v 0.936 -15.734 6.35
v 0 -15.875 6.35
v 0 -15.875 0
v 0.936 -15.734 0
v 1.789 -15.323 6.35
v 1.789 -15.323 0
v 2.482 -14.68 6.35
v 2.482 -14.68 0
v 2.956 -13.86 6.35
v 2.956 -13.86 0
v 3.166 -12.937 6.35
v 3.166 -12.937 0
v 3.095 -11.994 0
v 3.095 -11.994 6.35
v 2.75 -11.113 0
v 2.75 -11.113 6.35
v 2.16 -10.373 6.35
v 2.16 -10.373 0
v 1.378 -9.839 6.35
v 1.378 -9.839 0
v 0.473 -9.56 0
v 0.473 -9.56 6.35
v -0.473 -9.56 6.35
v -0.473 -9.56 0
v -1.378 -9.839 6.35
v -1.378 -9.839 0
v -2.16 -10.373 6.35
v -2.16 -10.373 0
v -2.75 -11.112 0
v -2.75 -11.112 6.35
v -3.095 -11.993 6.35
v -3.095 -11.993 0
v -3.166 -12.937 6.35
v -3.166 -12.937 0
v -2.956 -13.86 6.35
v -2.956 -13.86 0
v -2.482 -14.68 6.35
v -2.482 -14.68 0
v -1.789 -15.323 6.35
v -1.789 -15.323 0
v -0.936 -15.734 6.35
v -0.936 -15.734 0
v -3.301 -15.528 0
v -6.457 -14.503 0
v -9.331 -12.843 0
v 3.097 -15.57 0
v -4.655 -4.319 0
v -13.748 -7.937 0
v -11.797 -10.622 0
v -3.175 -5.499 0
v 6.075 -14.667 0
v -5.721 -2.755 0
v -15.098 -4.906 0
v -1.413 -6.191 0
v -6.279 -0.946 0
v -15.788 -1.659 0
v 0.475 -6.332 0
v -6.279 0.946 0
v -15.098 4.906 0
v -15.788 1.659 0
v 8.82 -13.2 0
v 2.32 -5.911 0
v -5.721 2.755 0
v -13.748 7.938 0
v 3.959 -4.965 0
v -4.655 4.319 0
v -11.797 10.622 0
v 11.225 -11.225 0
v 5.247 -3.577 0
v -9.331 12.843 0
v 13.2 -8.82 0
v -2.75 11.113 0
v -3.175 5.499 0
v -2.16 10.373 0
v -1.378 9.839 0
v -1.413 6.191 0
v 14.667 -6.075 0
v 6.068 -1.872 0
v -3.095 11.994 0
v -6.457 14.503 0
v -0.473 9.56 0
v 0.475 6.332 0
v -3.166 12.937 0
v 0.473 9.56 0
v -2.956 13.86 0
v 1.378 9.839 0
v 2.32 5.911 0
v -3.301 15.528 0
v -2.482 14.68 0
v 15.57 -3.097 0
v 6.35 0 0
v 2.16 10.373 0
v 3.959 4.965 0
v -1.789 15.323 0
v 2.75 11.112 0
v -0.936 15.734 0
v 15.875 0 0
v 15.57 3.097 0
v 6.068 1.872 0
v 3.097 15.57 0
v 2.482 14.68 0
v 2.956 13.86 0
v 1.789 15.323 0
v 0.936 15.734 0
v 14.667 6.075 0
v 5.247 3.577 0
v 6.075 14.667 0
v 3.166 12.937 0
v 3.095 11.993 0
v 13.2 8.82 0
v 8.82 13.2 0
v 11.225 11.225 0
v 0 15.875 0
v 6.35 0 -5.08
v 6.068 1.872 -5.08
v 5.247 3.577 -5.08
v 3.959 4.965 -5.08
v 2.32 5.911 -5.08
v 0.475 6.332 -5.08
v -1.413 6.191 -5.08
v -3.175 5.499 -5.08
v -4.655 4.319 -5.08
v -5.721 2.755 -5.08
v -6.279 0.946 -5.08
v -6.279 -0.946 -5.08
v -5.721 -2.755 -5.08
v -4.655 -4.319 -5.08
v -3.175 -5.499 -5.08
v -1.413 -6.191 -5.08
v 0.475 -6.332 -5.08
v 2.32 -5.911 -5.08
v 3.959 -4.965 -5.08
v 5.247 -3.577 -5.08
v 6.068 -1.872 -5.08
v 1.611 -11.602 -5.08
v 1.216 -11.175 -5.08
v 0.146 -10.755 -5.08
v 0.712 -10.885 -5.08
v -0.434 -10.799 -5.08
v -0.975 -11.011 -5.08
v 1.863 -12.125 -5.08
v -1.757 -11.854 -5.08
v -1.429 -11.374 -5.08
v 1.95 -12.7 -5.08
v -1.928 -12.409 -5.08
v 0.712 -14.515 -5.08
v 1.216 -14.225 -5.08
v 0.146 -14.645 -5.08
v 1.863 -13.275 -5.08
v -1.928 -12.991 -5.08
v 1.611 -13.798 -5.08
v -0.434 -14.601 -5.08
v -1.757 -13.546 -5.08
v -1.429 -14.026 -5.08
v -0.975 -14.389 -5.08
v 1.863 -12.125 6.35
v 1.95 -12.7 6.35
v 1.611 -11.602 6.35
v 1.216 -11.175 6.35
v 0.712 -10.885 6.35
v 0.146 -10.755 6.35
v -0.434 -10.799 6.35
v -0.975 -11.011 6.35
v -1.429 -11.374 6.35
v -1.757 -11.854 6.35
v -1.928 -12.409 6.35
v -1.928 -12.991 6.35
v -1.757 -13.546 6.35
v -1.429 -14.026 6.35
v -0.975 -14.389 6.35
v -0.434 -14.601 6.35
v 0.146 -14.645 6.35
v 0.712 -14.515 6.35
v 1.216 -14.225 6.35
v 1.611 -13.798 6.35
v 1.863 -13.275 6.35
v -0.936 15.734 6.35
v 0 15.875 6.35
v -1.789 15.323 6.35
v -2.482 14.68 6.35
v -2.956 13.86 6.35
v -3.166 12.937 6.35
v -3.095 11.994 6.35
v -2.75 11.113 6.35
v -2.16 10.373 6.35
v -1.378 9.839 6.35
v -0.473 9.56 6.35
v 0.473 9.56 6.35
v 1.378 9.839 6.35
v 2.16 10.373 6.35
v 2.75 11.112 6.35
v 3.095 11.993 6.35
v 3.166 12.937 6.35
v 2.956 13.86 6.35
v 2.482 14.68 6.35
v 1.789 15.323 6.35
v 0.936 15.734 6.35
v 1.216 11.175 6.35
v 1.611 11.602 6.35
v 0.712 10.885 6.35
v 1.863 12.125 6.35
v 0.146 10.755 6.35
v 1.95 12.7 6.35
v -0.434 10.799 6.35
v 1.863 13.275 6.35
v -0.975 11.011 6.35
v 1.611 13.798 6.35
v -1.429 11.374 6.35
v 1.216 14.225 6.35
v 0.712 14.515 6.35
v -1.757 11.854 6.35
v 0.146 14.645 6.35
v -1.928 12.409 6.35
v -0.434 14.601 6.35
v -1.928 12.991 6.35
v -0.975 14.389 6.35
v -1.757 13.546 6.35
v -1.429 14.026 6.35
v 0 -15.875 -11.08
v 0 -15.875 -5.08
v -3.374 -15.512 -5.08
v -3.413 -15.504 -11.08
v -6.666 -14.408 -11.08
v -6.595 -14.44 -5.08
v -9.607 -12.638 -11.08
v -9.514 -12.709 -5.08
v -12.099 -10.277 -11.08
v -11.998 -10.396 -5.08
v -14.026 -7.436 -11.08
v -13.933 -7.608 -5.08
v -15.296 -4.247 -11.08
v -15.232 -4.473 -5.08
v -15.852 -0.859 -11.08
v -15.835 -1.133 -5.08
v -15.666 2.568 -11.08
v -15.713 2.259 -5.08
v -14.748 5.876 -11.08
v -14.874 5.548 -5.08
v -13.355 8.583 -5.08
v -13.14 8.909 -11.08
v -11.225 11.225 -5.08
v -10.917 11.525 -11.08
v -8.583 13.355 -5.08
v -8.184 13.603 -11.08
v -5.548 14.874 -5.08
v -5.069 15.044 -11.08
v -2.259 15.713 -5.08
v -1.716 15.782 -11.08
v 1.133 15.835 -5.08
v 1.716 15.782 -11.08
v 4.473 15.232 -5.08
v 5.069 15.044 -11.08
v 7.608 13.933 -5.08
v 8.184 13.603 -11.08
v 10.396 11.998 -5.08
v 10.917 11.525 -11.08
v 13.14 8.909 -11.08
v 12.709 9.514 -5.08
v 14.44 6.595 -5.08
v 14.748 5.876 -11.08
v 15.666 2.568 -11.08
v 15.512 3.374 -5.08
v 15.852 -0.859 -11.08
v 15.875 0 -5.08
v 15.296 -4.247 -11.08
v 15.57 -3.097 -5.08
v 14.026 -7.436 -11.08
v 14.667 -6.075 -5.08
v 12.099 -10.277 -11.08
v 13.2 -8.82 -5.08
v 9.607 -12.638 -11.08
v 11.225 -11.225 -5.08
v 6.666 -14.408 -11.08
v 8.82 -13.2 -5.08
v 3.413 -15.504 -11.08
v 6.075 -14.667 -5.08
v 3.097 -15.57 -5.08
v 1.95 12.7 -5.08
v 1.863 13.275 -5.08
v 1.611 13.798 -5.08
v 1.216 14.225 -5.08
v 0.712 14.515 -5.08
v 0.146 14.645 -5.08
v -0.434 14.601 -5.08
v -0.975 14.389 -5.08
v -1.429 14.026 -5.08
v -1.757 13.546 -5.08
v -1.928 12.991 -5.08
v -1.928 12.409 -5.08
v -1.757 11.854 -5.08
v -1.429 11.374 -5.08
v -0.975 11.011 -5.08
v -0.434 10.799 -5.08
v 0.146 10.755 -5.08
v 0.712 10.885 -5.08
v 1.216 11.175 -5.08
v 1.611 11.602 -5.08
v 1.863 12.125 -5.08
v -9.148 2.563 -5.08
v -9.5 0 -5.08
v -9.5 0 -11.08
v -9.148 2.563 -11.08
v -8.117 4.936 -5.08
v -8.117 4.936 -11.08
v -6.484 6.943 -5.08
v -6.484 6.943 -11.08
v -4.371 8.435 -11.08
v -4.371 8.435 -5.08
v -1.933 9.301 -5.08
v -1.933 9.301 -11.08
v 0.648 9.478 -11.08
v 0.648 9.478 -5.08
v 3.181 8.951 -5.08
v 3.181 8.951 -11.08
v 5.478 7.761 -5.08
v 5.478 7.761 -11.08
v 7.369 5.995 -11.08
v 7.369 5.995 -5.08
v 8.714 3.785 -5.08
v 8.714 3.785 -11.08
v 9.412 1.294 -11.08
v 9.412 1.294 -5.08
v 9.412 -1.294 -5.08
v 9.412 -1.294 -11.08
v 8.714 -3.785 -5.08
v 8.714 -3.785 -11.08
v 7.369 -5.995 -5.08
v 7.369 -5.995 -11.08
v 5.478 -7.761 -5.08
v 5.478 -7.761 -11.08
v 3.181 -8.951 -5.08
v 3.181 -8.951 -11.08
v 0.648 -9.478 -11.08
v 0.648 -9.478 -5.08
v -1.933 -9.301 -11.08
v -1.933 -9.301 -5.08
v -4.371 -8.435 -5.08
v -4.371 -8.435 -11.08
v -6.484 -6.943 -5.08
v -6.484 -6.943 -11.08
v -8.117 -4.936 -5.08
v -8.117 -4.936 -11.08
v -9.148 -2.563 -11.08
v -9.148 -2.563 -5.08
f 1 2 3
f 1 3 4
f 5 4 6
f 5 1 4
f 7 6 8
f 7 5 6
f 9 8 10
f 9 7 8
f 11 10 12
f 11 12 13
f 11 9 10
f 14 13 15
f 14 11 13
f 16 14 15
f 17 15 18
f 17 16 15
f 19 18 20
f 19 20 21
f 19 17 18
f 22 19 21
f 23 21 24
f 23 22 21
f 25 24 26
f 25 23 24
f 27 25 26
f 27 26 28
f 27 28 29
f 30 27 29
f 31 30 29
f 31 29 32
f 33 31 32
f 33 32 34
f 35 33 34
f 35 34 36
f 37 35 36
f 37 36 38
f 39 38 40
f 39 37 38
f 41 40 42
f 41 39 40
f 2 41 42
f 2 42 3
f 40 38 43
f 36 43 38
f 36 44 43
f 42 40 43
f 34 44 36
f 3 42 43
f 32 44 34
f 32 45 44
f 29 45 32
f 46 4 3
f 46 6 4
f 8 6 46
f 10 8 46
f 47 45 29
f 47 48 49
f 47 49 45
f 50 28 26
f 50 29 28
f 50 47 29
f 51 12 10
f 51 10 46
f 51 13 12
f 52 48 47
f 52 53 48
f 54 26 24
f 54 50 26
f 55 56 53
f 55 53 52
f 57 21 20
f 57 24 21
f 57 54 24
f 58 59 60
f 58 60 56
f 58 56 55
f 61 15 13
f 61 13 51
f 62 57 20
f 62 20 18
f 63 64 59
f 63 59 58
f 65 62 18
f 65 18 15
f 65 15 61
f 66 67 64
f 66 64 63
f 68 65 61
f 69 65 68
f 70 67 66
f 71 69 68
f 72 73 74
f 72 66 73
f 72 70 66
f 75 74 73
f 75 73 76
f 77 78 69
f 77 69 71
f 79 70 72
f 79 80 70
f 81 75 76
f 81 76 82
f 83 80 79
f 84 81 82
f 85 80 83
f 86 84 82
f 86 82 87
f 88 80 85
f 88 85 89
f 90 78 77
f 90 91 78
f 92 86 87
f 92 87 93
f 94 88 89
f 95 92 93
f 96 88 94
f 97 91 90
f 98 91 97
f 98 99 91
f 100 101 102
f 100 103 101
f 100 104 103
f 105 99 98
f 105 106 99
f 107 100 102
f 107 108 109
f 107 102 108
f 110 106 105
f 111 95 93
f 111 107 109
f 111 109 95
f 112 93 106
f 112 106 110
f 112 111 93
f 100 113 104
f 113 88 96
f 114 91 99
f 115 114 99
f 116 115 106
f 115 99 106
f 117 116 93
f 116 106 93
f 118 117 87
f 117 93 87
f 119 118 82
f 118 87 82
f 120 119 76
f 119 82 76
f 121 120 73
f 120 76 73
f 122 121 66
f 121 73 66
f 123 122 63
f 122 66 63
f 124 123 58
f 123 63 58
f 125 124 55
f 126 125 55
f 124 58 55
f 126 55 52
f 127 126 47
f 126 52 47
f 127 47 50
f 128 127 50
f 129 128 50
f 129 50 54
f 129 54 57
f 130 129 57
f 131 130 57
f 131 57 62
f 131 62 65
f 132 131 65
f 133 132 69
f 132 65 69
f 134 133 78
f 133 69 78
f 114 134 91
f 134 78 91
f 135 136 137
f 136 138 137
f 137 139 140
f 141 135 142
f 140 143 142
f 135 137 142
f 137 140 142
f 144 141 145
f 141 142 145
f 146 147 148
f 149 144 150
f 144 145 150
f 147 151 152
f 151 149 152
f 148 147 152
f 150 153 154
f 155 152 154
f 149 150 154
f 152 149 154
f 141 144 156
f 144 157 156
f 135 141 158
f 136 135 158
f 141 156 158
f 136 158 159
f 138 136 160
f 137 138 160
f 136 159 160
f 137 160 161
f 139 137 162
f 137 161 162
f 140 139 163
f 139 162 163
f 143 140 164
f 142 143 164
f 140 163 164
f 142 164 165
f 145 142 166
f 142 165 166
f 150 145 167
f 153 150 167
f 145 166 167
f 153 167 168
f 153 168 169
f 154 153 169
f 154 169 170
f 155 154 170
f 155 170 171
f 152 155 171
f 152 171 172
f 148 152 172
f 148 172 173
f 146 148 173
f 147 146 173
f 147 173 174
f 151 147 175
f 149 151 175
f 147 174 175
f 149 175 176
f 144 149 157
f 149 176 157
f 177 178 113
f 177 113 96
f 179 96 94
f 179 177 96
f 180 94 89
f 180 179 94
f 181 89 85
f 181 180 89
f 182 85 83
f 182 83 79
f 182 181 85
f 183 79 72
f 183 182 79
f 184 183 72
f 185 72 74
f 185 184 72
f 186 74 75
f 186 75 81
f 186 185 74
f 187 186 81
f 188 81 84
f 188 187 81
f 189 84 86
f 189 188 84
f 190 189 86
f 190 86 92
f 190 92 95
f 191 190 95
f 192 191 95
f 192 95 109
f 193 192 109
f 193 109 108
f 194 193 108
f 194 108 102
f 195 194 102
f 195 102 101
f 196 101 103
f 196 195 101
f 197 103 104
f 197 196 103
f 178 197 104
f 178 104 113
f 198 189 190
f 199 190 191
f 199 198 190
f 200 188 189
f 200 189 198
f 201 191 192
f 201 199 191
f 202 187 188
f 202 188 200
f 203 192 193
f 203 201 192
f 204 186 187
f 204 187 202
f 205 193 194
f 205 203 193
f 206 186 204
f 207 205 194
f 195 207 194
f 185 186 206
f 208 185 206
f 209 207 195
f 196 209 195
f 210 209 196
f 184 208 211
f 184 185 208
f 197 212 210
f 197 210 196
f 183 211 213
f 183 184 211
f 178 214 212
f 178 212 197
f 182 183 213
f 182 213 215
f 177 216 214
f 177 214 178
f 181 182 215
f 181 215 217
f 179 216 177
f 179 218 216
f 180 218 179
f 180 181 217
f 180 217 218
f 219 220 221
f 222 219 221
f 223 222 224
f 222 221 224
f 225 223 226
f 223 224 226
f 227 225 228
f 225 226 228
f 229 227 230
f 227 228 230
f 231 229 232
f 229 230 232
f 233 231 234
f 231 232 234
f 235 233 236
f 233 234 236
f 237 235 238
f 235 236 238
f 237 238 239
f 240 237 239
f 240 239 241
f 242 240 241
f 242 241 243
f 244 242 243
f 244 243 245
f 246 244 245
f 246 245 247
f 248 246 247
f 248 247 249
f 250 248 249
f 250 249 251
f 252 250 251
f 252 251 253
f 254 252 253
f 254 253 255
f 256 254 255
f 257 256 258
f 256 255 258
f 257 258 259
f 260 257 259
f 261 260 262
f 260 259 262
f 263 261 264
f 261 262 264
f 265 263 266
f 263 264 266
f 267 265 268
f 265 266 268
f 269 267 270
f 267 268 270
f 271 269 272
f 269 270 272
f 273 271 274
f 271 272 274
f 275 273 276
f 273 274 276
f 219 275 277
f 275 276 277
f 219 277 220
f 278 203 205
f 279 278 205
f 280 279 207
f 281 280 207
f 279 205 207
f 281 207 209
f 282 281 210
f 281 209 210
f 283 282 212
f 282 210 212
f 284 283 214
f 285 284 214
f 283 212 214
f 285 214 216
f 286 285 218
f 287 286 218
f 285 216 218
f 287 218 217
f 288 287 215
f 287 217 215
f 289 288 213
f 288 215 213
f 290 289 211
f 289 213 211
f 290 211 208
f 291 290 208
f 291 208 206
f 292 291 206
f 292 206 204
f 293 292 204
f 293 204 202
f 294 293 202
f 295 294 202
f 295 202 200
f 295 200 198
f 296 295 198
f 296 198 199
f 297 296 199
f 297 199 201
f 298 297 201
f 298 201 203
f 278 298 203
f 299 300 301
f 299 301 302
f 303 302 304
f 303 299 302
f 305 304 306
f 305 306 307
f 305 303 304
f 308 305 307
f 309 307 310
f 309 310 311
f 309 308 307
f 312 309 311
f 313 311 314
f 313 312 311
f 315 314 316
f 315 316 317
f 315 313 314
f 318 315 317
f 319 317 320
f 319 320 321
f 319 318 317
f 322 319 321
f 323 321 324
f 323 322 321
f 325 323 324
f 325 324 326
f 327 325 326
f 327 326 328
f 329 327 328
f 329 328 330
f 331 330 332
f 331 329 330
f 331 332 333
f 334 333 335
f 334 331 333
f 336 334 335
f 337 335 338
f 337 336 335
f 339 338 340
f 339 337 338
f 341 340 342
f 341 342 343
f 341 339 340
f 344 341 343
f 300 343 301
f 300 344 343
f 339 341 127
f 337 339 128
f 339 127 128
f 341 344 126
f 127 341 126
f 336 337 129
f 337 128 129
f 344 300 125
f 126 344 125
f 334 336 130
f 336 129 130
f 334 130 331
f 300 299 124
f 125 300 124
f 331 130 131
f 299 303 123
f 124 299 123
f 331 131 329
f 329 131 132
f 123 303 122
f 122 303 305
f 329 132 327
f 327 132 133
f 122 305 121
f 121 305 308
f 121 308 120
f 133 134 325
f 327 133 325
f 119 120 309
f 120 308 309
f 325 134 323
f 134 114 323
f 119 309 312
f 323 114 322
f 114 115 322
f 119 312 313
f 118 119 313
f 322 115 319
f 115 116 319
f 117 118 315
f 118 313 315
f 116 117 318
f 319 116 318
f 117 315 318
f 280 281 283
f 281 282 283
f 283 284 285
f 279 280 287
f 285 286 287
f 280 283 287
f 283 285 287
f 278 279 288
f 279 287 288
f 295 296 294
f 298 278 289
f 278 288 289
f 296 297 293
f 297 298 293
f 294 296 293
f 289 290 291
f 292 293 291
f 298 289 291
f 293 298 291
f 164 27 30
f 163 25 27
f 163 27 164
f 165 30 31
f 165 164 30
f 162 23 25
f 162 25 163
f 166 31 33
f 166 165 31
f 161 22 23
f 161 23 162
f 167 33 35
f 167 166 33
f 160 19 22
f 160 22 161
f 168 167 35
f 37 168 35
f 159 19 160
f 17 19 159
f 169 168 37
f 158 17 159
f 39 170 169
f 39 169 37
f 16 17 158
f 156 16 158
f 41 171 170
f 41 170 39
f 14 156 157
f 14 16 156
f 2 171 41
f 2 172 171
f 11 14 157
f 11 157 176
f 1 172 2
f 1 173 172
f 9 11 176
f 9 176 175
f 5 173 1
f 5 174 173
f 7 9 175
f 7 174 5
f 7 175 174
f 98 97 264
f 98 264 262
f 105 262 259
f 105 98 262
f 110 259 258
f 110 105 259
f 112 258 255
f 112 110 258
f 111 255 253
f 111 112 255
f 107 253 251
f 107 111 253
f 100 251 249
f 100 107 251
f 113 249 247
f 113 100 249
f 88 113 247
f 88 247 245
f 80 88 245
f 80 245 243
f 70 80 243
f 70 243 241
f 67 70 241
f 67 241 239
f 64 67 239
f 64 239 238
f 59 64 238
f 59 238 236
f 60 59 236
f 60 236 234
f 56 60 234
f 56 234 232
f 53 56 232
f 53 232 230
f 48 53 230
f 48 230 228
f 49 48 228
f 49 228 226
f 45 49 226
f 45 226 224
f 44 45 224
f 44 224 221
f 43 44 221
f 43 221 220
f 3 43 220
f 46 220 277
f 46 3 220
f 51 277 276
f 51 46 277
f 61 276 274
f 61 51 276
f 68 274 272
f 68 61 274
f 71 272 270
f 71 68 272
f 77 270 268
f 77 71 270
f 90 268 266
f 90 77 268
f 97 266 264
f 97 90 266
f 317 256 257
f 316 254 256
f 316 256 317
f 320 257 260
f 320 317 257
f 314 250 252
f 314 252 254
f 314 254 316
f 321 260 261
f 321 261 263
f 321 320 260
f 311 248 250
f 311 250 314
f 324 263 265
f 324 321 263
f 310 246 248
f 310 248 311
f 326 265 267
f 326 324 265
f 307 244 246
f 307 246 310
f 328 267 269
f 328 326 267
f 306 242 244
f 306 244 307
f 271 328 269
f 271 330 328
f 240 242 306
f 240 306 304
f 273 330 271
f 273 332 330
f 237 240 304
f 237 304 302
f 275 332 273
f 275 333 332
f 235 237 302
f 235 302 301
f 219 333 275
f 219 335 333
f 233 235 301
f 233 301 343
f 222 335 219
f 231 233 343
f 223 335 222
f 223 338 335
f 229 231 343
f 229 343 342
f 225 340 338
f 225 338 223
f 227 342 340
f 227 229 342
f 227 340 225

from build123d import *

# Parameters (mm, degrees)
SKETCH1_R           = 15.875
SKETCH1_R_2         = 1.95
SKETCH1_R_3         = 6.35
BOSS_EXTRUDE1_DEPTH = 5.08
BOSS_EXTRUDE2_START = 6.35
SKETCH1_3_R         = 3.175
SKETCH1_3_R_2       = 1.95
BOSS_EXTRUDE2_DEPTH = 6.35
SKETCH2_R           = 15.875
SKETCH2_R_2         = 9.5
BOSS_EXTRUDE3_DEPTH = 6


with BuildPart() as part:
    # Sketch1 → Boss-Extrude1 (new body)
    with BuildSketch(Plane.XY):
        Circle(SKETCH1_R)
        with Locations((0, 12.7)):
            Circle(SKETCH1_R_2, mode=Mode.SUBTRACT)
        Circle(SKETCH1_R_3, mode=Mode.SUBTRACT)
        with Locations((0, -12.7)):
            Circle(SKETCH1_R_2, mode=Mode.SUBTRACT)
    extrude(amount=-BOSS_EXTRUDE1_DEPTH)

    # Sketch1<3> → Boss-Extrude2 (add)
    # profile 1 of 2: a face of its own
    with BuildSketch(Plane.XY.offset(BOSS_EXTRUDE2_START)):
        with Locations((0, 12.7)):
            Circle(SKETCH1_3_R)
        with Locations((0, 12.7)):
            Circle(SKETCH1_3_R_2, mode=Mode.SUBTRACT)
    # profile 2 of 2: a face of its own
    with BuildSketch(Plane.XY.offset(BOSS_EXTRUDE2_START)):
        with Locations((0, -12.7)):
            Circle(SKETCH1_3_R)
        with Locations((0, -12.7)):
            Circle(SKETCH1_3_R_2, mode=Mode.SUBTRACT)
    extrude(amount=-BOSS_EXTRUDE2_DEPTH)

    # Sketch2 → Boss-Extrude3 (add)
    with BuildSketch(Plane(origin=(0, 0, -5.08), x_dir=(-1, 0, 0), z_dir=(0, 0, -1))):
        Circle(SKETCH2_R)
        Circle(SKETCH2_R_2, mode=Mode.SUBTRACT)
    extrude(amount=BOSS_EXTRUDE3_DEPTH)


solid = part.part
